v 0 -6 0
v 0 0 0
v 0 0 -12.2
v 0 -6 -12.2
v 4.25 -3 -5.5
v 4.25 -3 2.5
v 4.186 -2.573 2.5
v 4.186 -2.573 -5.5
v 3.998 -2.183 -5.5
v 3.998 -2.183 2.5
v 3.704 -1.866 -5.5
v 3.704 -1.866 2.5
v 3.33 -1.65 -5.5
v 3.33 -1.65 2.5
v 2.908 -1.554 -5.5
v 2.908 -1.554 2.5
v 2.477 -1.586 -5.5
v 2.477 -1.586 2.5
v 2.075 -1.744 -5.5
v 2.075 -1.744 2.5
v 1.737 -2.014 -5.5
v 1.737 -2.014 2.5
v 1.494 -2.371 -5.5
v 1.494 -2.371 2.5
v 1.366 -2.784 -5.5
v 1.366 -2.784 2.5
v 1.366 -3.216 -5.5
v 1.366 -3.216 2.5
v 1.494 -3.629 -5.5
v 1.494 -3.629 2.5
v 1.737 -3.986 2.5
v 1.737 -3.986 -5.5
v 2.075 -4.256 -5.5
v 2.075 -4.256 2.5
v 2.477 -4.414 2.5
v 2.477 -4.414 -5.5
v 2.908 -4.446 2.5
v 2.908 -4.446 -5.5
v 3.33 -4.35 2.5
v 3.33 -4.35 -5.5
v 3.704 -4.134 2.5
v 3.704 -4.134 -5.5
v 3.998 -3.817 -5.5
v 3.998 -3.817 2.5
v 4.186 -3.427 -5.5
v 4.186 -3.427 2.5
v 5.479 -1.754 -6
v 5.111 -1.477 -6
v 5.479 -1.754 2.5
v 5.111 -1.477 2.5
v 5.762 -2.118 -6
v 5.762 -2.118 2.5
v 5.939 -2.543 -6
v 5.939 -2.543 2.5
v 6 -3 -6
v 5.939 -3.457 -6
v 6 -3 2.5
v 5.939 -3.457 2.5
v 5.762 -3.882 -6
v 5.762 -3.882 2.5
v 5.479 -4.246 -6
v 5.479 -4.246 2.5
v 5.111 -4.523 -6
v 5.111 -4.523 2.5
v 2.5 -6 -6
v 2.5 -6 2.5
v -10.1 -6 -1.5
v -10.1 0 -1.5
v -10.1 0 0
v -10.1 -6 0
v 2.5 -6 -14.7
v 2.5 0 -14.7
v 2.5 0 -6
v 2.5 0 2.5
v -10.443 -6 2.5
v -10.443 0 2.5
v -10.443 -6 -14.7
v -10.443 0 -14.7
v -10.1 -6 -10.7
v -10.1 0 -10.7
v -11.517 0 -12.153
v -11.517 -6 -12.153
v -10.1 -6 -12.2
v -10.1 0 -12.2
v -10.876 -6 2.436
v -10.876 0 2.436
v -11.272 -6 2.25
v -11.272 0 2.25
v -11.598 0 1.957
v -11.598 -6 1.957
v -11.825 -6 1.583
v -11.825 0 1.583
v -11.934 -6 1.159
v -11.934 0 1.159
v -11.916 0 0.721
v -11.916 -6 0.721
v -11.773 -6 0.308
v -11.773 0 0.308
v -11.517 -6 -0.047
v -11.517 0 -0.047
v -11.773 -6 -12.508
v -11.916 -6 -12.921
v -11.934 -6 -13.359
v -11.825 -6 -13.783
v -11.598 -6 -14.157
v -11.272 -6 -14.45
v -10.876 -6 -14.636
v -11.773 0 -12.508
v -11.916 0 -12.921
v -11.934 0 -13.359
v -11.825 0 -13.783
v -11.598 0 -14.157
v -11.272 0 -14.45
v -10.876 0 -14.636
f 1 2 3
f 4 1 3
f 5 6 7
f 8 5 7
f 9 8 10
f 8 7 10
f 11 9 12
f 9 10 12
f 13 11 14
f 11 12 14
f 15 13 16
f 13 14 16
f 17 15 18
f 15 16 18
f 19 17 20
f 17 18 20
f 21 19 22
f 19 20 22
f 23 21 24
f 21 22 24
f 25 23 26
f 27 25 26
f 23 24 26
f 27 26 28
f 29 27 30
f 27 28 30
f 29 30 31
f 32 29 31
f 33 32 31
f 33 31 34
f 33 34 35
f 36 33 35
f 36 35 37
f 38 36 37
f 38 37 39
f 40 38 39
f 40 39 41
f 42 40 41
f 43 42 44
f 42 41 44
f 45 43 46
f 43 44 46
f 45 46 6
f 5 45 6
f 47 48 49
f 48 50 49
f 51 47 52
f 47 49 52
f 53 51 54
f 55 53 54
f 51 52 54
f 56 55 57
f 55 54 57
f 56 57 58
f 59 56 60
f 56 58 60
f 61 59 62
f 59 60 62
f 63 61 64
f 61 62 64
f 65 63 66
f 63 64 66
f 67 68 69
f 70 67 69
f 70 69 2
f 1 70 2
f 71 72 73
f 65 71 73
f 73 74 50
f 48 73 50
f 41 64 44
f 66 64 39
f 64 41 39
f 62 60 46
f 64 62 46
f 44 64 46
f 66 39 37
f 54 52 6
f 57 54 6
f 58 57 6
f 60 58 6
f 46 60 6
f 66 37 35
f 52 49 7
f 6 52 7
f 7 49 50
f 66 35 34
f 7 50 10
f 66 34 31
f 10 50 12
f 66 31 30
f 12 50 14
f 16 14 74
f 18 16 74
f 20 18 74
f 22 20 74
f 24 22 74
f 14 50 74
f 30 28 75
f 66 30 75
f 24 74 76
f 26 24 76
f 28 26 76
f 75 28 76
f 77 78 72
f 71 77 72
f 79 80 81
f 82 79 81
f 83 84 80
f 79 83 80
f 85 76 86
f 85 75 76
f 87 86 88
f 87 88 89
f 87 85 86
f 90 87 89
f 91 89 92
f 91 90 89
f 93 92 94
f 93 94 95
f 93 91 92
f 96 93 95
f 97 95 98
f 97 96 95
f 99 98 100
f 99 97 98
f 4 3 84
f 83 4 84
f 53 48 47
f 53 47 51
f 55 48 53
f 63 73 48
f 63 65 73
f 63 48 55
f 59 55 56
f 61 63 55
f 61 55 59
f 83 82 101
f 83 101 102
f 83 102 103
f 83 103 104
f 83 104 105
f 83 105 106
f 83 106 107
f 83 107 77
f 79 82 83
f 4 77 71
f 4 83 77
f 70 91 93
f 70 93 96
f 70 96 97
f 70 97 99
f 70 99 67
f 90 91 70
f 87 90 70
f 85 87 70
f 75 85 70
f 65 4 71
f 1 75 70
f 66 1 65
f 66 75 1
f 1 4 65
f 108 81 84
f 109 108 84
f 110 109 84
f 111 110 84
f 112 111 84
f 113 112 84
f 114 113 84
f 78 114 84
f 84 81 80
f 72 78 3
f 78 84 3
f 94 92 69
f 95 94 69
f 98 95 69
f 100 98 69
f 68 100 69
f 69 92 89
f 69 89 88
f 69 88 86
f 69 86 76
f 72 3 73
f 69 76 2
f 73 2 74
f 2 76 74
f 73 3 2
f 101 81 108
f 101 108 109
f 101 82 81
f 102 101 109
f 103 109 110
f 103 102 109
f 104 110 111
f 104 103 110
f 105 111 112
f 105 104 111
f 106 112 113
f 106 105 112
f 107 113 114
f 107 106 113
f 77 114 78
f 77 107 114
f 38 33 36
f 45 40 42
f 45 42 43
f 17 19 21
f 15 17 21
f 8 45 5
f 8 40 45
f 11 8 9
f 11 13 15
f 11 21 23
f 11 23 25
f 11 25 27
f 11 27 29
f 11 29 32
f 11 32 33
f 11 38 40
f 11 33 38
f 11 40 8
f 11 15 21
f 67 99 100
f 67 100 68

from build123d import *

# Parameters (mm, degrees)
F1_DEPTH = 6
F2_R     = 1.5
F4_DEPTH = 6
F5_DEPTH = 4
F6_R     = 1.45
F7_DEPTH = 8


with BuildPart() as f1:
    # F0 (on Front) → F1 (new body)
    with BuildSketch(Plane.XZ):
        Polygon((0, 0), (0, -12.2), (-10.1, -12.2), (-10.1, -10.7), (-14, -14.7), (2.5, -14.7), (2.5, 0), (6, 0), (6, 2.5), (-14, 2.5), (-10.1, -1.5), (-10.1, 0), align=None)
    extrude(amount=F1_DEPTH)

    # F2
    f2_edges = [f1.edges().sort_by_distance(p)[0] for p in [
        (-14, -3, -14.7),
        (-14, -3, 2.5),
    ]]
    fillet(f2_edges, radius=F2_R)

    # F3 (on face) → F4 (join)
    with BuildSketch(Plane(origin=(0, 0, 0), x_dir=(1, 0, 0), z_dir=(0, 0, -1))):
        with BuildLine():
            Line((2.5, 0), (5.1113989637, 1.4766839378))
            ThreePointArc((5.1113989637, 1.4766839378), (5.7616130766, 2.1182257053), (6, 3))
            ThreePointArc((6, 3), (5.7616130766, 3.8817742947), (5.1113989637, 4.5233160622))
            Line((5.1113989637, 4.5233160622), (2.5, 6))
            Line((2.5, 6), (2.5, 0))
        make_face()
    extrude(amount=F4_DEPTH)

    # F5 (cut): faces of the model
    f5_faces = [f1.faces().sort_by_distance(p)[0] for p in [
        (4.8789891279, -0.7262583823, 0),
        (4.8789891279, -5.2737416177, 0),
    ]]
    extrude(f5_faces, amount=-F5_DEPTH, mode=Mode.SUBTRACT)

    # F6 (on face) → F7 (cut)
    with BuildSketch(Plane.XY.offset(2.5)):
        with Locations((2.8, -3)):
            Circle(F6_R)
    extrude(amount=-F7_DEPTH, mode=Mode.SUBTRACT)


solid = f1.part
